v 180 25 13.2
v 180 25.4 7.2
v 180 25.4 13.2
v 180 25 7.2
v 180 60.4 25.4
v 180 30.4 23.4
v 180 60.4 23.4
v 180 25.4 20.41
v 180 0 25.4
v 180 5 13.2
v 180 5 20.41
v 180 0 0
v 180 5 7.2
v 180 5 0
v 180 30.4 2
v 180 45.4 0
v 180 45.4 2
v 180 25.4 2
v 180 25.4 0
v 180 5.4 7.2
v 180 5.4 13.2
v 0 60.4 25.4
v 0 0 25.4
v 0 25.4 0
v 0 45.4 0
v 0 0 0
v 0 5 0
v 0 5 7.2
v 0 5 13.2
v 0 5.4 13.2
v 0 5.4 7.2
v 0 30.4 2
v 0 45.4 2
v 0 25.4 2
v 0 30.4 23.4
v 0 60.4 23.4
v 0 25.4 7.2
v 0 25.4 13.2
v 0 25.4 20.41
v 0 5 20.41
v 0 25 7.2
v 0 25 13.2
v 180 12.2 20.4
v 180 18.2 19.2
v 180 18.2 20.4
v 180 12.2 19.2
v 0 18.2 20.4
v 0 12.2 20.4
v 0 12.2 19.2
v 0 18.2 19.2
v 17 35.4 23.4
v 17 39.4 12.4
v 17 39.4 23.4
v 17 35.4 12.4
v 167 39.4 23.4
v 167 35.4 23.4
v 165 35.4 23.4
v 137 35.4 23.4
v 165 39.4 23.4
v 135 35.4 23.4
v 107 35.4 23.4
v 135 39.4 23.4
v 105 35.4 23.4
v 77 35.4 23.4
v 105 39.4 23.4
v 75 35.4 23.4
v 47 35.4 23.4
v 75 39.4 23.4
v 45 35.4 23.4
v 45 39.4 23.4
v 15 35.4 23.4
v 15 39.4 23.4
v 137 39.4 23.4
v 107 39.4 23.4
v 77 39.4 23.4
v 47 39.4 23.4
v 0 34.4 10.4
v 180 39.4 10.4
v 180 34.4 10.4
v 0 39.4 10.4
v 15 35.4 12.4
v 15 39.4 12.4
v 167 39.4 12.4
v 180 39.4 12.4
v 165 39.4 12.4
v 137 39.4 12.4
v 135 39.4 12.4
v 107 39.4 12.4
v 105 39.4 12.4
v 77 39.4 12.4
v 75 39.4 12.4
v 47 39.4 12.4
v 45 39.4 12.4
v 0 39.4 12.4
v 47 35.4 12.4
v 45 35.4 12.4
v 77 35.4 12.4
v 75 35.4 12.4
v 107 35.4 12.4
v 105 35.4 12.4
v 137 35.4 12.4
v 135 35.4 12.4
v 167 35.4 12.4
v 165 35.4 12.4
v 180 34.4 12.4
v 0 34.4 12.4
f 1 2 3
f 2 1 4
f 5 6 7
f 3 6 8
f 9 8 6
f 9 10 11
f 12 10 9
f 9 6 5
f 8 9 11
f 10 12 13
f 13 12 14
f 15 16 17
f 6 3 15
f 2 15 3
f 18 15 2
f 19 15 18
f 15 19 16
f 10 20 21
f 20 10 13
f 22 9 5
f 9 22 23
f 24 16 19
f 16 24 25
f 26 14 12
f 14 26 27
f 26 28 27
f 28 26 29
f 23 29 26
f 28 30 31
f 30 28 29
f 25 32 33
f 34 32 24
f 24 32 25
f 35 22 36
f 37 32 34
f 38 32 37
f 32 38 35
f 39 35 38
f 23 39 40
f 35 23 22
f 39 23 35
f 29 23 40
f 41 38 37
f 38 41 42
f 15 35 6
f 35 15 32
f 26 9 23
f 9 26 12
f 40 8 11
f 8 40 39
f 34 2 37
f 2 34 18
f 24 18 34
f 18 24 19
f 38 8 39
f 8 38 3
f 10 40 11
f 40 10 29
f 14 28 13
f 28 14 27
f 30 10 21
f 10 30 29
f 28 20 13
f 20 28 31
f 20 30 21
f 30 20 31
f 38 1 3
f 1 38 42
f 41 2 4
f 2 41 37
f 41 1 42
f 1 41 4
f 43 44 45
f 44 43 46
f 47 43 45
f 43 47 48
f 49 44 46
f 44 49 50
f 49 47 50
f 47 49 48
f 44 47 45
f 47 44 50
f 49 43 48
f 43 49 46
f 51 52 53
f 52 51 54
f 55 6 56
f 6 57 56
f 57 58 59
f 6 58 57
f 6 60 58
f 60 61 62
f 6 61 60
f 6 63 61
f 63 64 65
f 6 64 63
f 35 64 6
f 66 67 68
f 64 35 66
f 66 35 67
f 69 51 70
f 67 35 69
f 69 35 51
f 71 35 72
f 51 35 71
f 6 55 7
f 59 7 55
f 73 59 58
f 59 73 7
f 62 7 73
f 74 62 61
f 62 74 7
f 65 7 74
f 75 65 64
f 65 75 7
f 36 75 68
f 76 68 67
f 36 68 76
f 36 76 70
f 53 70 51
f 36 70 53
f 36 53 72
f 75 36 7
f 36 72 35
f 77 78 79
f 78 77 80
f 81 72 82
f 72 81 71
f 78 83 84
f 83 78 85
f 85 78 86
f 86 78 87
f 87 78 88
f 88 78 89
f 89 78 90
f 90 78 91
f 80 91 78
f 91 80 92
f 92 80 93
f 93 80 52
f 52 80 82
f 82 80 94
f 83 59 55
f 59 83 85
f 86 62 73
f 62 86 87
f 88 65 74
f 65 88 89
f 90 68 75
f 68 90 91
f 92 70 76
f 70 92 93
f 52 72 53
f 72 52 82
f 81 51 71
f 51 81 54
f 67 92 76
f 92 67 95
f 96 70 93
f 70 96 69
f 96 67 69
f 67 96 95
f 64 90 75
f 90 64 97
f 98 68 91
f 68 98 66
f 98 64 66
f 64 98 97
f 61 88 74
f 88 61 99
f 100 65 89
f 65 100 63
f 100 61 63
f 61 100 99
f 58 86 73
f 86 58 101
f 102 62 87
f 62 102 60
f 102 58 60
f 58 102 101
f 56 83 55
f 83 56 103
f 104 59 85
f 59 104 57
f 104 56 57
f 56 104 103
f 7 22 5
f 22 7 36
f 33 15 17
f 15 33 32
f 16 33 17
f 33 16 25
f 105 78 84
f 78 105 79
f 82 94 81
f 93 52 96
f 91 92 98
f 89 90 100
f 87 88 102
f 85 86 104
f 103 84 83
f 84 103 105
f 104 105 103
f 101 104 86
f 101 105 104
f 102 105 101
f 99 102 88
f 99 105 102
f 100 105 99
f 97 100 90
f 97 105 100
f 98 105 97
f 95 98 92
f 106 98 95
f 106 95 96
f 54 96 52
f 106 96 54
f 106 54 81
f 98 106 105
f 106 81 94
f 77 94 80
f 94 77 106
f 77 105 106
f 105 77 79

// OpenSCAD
// units
in = 25.4;
cm = 10;
mm = 1;
inf = 10e10;
nc = 10e-3;
$fn = 200;

// params
wall_thickness = 5*mm;
led_clip_thickness = 2*mm;

length = 18*cm;
shield_length = 3*cm;
back_shield_length = 1.5*cm;
clip_length = 1.3*cm;
led_strip_space = 5*mm;
clip_spacing = 3*cm;
clip_angle = 30; //degrees


// constants
2020_width = 20.4*mm;
2020_center_width = 6*mm;
2020_center_depth = .4*mm;
outer_width = 2020_width + wall_thickness*2;
outer_height = 2020_width + wall_thickness;

module 2020_hug(length) {
    difference() {
        // tube
        cube(size=[length, outer_width, outer_height]);

        // subtract where 2020 goes
        translate([-0.01, wall_thickness, -0.01])
        cube(size=[length+0.02, 2020_width, 2020_width+0.02]);
    }

    // outside snap indent
    translate([0, wall_thickness, 2020_width/2-2020_center_width/2])
    cube(size=[length,2020_center_depth,2020_center_width]);
    
    // inside snap
    translate([0, outer_width-wall_thickness-2020_center_depth, 2020_width/2-2020_center_width/2])
    cube(size=[length,2020_center_depth,2020_center_width]);
    
    // top snap
    translate([0, wall_thickness+2020_width/2-2020_center_width/2, 2020_width-2020_center_depth*3])
    cube(size=[length,2020_center_width,2020_center_depth*3]);
}


2020_hug(length);

// user-side shield
translate([0, 2020_width+wall_thickness, outer_height-led_clip_thickness])
cube([length, shield_length+wall_thickness, led_clip_thickness]);

// back-side shield
translate([0, 2020_width+wall_thickness, 0])
cube([length, back_shield_length+wall_thickness, led_clip_thickness]);

color("red")
for (i=[0:clip_spacing:length-led_clip_thickness]) {
    translate([i/10*1*cm+clip_spacing/2, outer_width+led_strip_space, outer_height-led_clip_thickness-clip_length])
    cube([led_clip_thickness, led_clip_thickness*2, clip_length]);
}

color("purple")
// led clip notch
translate([0, outer_width+led_strip_space-1, outer_height-led_clip_thickness-clip_length])
cube([length, led_clip_thickness*2+1, led_clip_thickness]);
